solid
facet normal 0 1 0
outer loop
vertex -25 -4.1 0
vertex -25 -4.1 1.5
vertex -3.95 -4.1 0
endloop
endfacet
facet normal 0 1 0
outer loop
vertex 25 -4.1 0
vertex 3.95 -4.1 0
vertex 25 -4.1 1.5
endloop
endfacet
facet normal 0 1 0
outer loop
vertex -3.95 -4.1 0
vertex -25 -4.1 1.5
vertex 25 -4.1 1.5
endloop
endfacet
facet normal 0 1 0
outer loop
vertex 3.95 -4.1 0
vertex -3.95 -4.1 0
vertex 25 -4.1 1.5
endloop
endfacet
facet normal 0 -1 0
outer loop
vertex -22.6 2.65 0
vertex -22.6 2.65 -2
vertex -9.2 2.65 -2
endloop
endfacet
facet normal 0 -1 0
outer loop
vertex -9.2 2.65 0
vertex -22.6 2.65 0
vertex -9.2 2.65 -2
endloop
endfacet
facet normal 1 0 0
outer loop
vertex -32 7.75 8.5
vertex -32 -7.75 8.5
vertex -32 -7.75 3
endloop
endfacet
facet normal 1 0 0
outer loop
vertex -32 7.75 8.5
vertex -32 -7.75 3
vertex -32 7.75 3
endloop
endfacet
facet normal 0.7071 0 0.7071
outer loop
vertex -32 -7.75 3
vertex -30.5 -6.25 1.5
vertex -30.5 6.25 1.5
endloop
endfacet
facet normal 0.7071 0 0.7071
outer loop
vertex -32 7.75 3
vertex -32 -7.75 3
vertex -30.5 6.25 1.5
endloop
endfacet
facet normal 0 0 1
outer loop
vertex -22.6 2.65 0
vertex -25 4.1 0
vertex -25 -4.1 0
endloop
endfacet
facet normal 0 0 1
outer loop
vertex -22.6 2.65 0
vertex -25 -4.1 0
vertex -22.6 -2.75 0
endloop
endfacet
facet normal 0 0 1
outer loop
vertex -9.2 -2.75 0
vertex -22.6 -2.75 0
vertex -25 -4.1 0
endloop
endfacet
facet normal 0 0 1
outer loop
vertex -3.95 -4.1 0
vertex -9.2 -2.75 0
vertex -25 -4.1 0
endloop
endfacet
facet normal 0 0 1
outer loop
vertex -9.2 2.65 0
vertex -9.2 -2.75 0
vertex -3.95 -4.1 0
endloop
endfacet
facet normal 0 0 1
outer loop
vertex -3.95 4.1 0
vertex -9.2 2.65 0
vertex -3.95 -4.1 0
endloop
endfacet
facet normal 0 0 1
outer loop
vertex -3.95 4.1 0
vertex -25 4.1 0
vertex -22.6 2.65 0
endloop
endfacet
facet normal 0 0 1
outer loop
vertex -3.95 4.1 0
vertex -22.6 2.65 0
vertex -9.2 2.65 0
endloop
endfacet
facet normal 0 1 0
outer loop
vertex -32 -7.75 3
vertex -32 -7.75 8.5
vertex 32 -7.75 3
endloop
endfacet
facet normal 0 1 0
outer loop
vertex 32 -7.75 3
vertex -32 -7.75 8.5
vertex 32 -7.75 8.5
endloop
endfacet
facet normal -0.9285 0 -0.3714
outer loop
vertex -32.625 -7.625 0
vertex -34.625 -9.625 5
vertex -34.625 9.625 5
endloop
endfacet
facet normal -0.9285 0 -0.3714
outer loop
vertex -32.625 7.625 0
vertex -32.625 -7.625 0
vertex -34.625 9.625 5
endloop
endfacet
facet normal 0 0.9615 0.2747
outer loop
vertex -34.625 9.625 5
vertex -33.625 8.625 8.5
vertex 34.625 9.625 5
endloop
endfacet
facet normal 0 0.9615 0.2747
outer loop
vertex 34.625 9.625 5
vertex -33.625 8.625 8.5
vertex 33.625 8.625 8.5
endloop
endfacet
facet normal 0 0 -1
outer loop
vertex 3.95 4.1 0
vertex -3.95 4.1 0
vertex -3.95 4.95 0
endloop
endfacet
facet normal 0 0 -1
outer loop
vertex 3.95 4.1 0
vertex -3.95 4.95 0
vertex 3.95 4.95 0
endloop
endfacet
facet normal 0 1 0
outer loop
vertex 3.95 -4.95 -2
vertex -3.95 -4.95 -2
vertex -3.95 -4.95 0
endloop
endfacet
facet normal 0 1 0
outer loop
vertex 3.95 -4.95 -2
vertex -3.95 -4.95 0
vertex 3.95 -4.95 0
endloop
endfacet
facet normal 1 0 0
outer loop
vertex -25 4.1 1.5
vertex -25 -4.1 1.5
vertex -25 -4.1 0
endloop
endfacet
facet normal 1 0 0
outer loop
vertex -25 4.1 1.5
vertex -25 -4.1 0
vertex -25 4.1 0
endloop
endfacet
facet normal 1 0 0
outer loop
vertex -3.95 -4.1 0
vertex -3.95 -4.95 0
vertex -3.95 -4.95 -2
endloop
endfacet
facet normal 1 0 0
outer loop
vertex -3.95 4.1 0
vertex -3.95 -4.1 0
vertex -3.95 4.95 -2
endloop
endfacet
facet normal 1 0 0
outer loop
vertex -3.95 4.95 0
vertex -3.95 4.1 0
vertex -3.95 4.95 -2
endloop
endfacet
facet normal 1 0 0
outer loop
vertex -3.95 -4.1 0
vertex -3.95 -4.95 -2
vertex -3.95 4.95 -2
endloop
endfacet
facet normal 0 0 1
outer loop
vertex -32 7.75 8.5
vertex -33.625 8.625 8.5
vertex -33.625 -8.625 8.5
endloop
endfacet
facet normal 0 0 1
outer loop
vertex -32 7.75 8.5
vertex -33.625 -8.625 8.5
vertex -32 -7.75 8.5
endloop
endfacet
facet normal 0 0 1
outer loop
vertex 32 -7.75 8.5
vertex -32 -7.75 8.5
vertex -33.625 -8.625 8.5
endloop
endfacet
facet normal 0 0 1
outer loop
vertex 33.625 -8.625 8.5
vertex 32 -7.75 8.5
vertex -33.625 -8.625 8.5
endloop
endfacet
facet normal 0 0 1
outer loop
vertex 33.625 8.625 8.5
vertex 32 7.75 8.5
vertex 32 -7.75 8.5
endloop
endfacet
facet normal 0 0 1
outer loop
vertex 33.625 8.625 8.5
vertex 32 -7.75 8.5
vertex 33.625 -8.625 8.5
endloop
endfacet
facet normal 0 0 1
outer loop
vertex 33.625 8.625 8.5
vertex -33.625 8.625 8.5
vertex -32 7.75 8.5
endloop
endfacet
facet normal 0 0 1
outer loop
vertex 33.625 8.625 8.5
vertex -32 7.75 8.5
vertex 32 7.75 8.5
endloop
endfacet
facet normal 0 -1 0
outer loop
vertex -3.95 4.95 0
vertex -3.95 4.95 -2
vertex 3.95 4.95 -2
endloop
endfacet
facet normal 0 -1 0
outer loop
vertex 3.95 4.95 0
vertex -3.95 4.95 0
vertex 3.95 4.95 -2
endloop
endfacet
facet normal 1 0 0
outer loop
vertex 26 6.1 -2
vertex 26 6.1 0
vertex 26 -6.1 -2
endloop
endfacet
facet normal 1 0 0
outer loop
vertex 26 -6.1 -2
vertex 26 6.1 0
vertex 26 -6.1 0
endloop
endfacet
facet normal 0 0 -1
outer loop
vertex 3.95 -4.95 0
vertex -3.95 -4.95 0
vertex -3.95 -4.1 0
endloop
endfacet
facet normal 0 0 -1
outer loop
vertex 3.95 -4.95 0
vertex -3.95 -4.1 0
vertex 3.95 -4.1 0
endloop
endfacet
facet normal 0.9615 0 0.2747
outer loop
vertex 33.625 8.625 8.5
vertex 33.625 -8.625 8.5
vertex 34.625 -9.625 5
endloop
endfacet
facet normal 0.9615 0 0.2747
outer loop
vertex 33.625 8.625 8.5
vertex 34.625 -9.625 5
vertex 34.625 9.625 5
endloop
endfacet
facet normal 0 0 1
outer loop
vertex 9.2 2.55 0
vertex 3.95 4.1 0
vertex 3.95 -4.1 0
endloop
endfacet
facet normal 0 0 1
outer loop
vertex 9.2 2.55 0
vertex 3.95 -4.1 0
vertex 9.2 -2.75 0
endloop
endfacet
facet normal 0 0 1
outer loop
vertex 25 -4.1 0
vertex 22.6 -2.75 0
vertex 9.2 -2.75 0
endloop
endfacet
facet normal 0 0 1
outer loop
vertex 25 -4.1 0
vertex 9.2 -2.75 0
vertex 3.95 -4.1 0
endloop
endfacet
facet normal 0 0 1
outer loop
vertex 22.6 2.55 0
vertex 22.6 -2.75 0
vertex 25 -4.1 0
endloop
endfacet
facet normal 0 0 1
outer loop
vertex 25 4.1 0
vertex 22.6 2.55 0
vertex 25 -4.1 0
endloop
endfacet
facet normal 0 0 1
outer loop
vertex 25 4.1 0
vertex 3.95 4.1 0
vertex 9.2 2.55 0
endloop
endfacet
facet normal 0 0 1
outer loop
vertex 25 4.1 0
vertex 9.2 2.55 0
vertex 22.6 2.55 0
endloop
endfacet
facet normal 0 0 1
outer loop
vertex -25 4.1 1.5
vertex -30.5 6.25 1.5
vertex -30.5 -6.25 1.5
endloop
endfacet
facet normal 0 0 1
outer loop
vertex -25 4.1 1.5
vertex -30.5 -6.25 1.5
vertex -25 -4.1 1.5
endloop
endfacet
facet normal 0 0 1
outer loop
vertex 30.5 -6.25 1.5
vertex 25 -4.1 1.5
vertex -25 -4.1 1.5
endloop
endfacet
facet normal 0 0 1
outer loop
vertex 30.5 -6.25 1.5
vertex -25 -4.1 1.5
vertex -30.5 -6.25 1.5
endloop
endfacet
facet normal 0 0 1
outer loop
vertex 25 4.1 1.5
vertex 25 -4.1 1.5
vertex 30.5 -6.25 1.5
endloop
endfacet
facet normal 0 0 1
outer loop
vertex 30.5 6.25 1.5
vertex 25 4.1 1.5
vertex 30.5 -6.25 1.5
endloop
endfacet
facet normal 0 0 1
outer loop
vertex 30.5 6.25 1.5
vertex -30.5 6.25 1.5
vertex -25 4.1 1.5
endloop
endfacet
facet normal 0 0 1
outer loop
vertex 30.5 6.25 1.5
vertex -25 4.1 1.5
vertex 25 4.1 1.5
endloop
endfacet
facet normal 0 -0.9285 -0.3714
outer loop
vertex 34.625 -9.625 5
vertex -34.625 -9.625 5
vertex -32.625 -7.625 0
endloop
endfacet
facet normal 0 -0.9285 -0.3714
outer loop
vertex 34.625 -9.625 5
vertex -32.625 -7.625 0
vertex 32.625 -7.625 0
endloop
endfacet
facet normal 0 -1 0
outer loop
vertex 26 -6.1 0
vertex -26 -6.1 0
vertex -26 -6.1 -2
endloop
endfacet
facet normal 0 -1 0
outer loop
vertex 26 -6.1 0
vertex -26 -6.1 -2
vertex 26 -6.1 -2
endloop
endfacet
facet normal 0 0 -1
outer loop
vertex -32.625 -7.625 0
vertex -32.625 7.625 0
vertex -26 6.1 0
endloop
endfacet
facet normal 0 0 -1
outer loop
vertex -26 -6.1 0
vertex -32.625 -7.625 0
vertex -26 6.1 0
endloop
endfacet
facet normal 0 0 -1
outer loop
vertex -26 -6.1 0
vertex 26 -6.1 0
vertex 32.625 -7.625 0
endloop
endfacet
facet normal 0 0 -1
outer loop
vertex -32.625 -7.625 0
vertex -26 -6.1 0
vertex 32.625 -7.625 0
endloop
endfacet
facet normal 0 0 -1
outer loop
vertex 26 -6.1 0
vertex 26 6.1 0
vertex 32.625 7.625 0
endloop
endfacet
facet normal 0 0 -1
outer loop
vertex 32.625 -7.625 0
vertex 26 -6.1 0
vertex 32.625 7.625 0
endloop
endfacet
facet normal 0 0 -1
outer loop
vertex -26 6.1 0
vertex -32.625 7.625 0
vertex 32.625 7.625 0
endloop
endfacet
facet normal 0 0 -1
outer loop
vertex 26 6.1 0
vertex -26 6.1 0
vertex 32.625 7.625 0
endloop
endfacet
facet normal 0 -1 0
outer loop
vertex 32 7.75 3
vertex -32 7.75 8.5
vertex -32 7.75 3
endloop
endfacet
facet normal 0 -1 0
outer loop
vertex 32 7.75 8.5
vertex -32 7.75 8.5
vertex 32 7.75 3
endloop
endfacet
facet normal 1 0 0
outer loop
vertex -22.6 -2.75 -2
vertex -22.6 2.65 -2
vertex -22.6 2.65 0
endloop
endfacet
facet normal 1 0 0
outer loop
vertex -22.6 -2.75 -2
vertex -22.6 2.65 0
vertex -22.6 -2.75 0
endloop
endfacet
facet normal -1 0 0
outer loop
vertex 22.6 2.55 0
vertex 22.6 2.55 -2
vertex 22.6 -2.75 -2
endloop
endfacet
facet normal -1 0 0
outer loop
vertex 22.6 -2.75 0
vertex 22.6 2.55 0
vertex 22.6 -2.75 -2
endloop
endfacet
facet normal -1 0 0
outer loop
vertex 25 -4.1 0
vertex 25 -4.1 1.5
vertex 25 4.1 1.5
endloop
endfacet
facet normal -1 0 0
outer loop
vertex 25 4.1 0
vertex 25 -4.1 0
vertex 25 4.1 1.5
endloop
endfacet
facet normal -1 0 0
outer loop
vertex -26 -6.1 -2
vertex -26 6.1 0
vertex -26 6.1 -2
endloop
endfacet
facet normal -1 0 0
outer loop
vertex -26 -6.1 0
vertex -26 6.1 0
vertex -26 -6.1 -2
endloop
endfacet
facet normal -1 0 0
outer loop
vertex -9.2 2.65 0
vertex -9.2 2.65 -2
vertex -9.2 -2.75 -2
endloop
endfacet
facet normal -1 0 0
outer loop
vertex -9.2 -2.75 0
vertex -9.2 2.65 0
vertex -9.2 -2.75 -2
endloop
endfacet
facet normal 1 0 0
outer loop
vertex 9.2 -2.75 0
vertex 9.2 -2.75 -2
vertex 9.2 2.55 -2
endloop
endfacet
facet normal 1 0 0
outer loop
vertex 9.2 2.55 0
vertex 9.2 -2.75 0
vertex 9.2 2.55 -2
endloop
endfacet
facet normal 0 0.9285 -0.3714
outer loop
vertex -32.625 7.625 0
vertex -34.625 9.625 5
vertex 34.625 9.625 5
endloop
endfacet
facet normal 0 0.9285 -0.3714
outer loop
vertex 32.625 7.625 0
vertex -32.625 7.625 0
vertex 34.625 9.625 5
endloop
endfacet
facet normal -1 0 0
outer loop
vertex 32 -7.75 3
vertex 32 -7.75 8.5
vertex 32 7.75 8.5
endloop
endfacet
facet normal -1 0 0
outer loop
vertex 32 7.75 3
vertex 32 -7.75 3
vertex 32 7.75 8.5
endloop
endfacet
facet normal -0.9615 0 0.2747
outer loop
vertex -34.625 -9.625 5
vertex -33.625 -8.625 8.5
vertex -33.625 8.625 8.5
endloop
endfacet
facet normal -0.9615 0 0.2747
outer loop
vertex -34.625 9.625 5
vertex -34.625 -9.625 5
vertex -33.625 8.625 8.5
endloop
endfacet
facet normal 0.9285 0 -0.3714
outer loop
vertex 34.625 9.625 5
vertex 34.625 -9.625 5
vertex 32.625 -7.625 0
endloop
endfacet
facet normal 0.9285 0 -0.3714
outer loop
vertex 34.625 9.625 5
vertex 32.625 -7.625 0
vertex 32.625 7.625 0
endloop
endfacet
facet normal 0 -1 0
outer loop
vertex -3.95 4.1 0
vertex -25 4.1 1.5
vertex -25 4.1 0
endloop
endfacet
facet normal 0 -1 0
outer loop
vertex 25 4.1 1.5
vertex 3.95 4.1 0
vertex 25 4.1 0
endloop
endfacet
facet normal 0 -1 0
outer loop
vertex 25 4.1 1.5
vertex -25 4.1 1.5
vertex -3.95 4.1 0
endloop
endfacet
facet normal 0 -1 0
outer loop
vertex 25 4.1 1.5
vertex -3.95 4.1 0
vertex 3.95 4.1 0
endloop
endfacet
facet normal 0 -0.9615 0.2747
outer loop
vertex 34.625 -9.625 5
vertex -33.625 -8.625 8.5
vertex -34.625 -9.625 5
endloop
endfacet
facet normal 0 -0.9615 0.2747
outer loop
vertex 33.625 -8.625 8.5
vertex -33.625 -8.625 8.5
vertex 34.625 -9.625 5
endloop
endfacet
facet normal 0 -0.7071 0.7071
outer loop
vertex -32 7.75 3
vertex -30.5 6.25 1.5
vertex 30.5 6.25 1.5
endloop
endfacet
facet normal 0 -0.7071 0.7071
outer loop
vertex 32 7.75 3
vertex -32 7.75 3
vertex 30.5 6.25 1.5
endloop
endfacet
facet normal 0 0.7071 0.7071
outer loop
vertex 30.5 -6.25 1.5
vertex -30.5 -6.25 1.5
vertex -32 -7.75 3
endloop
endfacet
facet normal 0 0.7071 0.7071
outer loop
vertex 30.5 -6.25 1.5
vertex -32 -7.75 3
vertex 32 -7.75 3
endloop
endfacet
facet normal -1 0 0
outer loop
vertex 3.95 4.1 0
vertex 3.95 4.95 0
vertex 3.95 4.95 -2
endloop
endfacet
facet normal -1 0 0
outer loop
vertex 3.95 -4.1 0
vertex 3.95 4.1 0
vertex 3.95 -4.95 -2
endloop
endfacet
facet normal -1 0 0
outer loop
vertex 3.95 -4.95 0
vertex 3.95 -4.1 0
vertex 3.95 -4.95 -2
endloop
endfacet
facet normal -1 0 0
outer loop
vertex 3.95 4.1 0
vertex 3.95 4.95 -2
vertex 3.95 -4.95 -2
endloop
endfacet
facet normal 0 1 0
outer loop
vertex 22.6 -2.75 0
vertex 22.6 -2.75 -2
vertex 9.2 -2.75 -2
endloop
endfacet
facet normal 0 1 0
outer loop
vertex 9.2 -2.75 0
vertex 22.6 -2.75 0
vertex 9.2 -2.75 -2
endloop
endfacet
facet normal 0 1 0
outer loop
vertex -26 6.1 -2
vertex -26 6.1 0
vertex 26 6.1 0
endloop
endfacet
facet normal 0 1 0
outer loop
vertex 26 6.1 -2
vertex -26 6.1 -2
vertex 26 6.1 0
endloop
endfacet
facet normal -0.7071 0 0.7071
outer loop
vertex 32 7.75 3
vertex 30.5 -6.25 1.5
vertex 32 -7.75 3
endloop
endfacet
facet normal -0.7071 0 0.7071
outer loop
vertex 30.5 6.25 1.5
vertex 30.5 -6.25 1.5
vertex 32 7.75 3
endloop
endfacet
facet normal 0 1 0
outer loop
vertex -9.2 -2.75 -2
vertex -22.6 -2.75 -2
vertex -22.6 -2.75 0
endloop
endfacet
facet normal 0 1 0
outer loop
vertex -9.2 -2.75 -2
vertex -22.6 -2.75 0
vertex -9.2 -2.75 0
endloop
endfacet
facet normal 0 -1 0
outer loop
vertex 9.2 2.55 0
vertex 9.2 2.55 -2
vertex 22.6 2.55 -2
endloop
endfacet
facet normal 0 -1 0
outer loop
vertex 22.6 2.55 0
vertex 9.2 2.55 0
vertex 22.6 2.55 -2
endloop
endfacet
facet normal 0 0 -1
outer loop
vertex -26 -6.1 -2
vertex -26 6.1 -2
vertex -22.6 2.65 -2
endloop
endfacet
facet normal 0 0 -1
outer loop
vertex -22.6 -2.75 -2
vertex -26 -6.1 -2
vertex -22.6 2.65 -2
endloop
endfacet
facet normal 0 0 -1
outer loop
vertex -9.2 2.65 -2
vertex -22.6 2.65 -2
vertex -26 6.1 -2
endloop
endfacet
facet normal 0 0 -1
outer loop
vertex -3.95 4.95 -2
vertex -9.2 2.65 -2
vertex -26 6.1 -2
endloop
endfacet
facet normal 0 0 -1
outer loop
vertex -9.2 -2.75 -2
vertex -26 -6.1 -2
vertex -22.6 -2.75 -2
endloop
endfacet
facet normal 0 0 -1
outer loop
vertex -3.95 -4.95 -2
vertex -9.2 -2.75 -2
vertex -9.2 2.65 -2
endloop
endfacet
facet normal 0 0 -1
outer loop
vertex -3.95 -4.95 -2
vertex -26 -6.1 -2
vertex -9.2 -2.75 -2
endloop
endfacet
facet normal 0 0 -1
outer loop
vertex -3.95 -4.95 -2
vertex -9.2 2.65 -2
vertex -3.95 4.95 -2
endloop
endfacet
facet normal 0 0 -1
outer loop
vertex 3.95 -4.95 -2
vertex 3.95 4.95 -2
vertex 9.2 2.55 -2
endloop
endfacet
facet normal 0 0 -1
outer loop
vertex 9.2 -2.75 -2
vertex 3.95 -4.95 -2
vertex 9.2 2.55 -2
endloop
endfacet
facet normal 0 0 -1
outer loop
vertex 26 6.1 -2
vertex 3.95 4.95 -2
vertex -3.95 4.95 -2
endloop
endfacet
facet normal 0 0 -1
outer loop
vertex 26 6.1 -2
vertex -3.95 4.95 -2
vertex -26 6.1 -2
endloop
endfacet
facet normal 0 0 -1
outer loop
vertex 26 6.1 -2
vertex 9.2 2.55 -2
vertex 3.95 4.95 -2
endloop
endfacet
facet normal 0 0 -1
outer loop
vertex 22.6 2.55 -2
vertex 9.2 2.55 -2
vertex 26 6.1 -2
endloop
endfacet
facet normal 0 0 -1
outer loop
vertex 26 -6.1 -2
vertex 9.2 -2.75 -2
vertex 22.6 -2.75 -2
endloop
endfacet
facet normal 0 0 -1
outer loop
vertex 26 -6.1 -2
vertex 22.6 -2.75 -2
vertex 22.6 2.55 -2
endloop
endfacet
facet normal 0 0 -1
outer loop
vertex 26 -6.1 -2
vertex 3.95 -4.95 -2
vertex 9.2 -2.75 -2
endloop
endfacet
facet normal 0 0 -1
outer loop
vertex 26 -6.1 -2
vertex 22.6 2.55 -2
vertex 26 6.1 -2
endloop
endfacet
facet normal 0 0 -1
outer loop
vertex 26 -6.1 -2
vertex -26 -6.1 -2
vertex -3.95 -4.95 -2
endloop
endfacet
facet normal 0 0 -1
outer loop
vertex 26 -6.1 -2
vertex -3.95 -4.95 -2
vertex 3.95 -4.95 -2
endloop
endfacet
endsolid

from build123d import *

# Parameters (mm, degrees)
F0_W      = 69.25
F0_H      = 19.25
F1_DEPTH  = 8.5
F3_SIZE2  = 1
F3_SIZE   = 3.5
F4_SIZE2  = 4.99999
F4_SIZE   = 1.99999
F2_W      = 64
F2_H      = 15.5
F5_DEPTH  = 7
F6_W      = 52
F6_H      = 12.2
F7_DEPTH  = 2
F8_W      = 7.9
F8_H      = 7.7
F8_H_2    = 2.2
F9_DEPTH  = 2
F8_W_2    = 13.4
F8_H_3    = 5.4
F10_DEPTH = 25
F11_W     = 50
F11_H     = 8.2
F11_W_2   = 13.4
F11_H_2   = 5.4
F11_H_3   = 5.3
F12_DEPTH = 1.5
F13_SIZE  = 1.5


# Not quite as in the source:
# - a fillet or chamfer is up to 0.001 mm smaller than in the source, because OpenCascade refuses the exact size


with BuildPart() as f1:
    # F0 (on Top) → F1 (new body)
    with BuildSketch(Plane.XY):
        Rectangle(F0_W, F0_H)
    extrude(amount=F1_DEPTH)

    # F3
    f3_edges = [f1.edges().sort_by_distance(p)[0] for p in [
        (-34.625, 0, 8.5),
        (0, -9.625, 8.5),
        (34.625, 0, 8.5),
        (0, 9.625, 8.5),
    ]]
    chamfer(f3_edges, length=F3_SIZE, length2=F3_SIZE2)

    # F4 (size 2 and 5 in the source; OpenCascade refuses exactly that, so slightly less here)
    f4_edges = [f1.edges().sort_by_distance(p)[0] for p in [
        (-34.625, 0, 0),
        (0, -9.625, 0),
        (0, 9.625, 0),
        (34.625, 0, 0),
    ]]
    f4_side = f1.faces().sort_by_distance((0, 0, 0))[0]
    chamfer(f4_edges, length=F4_SIZE, length2=F4_SIZE2, reference=f4_side)

    # F2 (on face) → F5 (cut)
    with BuildSketch(Plane.XY.offset(8.5)):
        Rectangle(F2_W, F2_H)
    extrude(amount=-F5_DEPTH, mode=Mode.SUBTRACT)

    # F6 (on face) → F7 (join)
    with BuildSketch(Plane(origin=(0, 0, 0), x_dir=(1, 0, 0), z_dir=(0, 0, -1))):
        Rectangle(F6_W, F6_H)
    extrude(amount=F7_DEPTH)

    # F8 (on face) → F9 (cut)
    with BuildSketch(Plane(origin=(0, 0, -2), x_dir=(1, 0, 0), z_dir=(0, 0, -1))):
        with Locations((0, -1.1)):
            Rectangle(F8_W, F8_H)
        with Locations((0, 3.85)):
            Rectangle(F8_W, F8_H_2)
    extrude(amount=-F9_DEPTH, mode=Mode.SUBTRACT)

    # F8 (on face) → F10 (cut)
    with BuildSketch(Plane(origin=(0, 0, -2), x_dir=(1, 0, 0), z_dir=(0, 0, -1))):
        with Locations((-15.9, 0.05)):
            Rectangle(F8_W_2, F8_H_3)
        Polygon((15.7195143402, 2.75), (9.2, 2.75), (9.2, -2.55), (22.6, -2.55), (22.6, 2.75), align=None)
    extrude(amount=-F10_DEPTH, mode=Mode.SUBTRACT)

    # F11 (on face) → F12 (cut)
    with BuildSketch(Plane.XY.offset(1.5)):
        Rectangle(F11_W, F11_H)
        with Locations((-15.9, -0.05)):
            Rectangle(F11_W_2, F11_H_2, mode=Mode.SUBTRACT)
        with Locations((15.9, -0.1)):
            Rectangle(F11_W_2, F11_H_3, mode=Mode.SUBTRACT)
    extrude(amount=-F12_DEPTH, mode=Mode.SUBTRACT)

    # F13
    f13_edges = [f1.edges().sort_by_distance(p)[0] for p in [
        (-32, 0, 1.5),
        (0, 7.75, 1.5),
        (32, 0, 1.5),
        (0, -7.75, 1.5),
    ]]
    chamfer(f13_edges, length=F13_SIZE)


solid = f1.part
